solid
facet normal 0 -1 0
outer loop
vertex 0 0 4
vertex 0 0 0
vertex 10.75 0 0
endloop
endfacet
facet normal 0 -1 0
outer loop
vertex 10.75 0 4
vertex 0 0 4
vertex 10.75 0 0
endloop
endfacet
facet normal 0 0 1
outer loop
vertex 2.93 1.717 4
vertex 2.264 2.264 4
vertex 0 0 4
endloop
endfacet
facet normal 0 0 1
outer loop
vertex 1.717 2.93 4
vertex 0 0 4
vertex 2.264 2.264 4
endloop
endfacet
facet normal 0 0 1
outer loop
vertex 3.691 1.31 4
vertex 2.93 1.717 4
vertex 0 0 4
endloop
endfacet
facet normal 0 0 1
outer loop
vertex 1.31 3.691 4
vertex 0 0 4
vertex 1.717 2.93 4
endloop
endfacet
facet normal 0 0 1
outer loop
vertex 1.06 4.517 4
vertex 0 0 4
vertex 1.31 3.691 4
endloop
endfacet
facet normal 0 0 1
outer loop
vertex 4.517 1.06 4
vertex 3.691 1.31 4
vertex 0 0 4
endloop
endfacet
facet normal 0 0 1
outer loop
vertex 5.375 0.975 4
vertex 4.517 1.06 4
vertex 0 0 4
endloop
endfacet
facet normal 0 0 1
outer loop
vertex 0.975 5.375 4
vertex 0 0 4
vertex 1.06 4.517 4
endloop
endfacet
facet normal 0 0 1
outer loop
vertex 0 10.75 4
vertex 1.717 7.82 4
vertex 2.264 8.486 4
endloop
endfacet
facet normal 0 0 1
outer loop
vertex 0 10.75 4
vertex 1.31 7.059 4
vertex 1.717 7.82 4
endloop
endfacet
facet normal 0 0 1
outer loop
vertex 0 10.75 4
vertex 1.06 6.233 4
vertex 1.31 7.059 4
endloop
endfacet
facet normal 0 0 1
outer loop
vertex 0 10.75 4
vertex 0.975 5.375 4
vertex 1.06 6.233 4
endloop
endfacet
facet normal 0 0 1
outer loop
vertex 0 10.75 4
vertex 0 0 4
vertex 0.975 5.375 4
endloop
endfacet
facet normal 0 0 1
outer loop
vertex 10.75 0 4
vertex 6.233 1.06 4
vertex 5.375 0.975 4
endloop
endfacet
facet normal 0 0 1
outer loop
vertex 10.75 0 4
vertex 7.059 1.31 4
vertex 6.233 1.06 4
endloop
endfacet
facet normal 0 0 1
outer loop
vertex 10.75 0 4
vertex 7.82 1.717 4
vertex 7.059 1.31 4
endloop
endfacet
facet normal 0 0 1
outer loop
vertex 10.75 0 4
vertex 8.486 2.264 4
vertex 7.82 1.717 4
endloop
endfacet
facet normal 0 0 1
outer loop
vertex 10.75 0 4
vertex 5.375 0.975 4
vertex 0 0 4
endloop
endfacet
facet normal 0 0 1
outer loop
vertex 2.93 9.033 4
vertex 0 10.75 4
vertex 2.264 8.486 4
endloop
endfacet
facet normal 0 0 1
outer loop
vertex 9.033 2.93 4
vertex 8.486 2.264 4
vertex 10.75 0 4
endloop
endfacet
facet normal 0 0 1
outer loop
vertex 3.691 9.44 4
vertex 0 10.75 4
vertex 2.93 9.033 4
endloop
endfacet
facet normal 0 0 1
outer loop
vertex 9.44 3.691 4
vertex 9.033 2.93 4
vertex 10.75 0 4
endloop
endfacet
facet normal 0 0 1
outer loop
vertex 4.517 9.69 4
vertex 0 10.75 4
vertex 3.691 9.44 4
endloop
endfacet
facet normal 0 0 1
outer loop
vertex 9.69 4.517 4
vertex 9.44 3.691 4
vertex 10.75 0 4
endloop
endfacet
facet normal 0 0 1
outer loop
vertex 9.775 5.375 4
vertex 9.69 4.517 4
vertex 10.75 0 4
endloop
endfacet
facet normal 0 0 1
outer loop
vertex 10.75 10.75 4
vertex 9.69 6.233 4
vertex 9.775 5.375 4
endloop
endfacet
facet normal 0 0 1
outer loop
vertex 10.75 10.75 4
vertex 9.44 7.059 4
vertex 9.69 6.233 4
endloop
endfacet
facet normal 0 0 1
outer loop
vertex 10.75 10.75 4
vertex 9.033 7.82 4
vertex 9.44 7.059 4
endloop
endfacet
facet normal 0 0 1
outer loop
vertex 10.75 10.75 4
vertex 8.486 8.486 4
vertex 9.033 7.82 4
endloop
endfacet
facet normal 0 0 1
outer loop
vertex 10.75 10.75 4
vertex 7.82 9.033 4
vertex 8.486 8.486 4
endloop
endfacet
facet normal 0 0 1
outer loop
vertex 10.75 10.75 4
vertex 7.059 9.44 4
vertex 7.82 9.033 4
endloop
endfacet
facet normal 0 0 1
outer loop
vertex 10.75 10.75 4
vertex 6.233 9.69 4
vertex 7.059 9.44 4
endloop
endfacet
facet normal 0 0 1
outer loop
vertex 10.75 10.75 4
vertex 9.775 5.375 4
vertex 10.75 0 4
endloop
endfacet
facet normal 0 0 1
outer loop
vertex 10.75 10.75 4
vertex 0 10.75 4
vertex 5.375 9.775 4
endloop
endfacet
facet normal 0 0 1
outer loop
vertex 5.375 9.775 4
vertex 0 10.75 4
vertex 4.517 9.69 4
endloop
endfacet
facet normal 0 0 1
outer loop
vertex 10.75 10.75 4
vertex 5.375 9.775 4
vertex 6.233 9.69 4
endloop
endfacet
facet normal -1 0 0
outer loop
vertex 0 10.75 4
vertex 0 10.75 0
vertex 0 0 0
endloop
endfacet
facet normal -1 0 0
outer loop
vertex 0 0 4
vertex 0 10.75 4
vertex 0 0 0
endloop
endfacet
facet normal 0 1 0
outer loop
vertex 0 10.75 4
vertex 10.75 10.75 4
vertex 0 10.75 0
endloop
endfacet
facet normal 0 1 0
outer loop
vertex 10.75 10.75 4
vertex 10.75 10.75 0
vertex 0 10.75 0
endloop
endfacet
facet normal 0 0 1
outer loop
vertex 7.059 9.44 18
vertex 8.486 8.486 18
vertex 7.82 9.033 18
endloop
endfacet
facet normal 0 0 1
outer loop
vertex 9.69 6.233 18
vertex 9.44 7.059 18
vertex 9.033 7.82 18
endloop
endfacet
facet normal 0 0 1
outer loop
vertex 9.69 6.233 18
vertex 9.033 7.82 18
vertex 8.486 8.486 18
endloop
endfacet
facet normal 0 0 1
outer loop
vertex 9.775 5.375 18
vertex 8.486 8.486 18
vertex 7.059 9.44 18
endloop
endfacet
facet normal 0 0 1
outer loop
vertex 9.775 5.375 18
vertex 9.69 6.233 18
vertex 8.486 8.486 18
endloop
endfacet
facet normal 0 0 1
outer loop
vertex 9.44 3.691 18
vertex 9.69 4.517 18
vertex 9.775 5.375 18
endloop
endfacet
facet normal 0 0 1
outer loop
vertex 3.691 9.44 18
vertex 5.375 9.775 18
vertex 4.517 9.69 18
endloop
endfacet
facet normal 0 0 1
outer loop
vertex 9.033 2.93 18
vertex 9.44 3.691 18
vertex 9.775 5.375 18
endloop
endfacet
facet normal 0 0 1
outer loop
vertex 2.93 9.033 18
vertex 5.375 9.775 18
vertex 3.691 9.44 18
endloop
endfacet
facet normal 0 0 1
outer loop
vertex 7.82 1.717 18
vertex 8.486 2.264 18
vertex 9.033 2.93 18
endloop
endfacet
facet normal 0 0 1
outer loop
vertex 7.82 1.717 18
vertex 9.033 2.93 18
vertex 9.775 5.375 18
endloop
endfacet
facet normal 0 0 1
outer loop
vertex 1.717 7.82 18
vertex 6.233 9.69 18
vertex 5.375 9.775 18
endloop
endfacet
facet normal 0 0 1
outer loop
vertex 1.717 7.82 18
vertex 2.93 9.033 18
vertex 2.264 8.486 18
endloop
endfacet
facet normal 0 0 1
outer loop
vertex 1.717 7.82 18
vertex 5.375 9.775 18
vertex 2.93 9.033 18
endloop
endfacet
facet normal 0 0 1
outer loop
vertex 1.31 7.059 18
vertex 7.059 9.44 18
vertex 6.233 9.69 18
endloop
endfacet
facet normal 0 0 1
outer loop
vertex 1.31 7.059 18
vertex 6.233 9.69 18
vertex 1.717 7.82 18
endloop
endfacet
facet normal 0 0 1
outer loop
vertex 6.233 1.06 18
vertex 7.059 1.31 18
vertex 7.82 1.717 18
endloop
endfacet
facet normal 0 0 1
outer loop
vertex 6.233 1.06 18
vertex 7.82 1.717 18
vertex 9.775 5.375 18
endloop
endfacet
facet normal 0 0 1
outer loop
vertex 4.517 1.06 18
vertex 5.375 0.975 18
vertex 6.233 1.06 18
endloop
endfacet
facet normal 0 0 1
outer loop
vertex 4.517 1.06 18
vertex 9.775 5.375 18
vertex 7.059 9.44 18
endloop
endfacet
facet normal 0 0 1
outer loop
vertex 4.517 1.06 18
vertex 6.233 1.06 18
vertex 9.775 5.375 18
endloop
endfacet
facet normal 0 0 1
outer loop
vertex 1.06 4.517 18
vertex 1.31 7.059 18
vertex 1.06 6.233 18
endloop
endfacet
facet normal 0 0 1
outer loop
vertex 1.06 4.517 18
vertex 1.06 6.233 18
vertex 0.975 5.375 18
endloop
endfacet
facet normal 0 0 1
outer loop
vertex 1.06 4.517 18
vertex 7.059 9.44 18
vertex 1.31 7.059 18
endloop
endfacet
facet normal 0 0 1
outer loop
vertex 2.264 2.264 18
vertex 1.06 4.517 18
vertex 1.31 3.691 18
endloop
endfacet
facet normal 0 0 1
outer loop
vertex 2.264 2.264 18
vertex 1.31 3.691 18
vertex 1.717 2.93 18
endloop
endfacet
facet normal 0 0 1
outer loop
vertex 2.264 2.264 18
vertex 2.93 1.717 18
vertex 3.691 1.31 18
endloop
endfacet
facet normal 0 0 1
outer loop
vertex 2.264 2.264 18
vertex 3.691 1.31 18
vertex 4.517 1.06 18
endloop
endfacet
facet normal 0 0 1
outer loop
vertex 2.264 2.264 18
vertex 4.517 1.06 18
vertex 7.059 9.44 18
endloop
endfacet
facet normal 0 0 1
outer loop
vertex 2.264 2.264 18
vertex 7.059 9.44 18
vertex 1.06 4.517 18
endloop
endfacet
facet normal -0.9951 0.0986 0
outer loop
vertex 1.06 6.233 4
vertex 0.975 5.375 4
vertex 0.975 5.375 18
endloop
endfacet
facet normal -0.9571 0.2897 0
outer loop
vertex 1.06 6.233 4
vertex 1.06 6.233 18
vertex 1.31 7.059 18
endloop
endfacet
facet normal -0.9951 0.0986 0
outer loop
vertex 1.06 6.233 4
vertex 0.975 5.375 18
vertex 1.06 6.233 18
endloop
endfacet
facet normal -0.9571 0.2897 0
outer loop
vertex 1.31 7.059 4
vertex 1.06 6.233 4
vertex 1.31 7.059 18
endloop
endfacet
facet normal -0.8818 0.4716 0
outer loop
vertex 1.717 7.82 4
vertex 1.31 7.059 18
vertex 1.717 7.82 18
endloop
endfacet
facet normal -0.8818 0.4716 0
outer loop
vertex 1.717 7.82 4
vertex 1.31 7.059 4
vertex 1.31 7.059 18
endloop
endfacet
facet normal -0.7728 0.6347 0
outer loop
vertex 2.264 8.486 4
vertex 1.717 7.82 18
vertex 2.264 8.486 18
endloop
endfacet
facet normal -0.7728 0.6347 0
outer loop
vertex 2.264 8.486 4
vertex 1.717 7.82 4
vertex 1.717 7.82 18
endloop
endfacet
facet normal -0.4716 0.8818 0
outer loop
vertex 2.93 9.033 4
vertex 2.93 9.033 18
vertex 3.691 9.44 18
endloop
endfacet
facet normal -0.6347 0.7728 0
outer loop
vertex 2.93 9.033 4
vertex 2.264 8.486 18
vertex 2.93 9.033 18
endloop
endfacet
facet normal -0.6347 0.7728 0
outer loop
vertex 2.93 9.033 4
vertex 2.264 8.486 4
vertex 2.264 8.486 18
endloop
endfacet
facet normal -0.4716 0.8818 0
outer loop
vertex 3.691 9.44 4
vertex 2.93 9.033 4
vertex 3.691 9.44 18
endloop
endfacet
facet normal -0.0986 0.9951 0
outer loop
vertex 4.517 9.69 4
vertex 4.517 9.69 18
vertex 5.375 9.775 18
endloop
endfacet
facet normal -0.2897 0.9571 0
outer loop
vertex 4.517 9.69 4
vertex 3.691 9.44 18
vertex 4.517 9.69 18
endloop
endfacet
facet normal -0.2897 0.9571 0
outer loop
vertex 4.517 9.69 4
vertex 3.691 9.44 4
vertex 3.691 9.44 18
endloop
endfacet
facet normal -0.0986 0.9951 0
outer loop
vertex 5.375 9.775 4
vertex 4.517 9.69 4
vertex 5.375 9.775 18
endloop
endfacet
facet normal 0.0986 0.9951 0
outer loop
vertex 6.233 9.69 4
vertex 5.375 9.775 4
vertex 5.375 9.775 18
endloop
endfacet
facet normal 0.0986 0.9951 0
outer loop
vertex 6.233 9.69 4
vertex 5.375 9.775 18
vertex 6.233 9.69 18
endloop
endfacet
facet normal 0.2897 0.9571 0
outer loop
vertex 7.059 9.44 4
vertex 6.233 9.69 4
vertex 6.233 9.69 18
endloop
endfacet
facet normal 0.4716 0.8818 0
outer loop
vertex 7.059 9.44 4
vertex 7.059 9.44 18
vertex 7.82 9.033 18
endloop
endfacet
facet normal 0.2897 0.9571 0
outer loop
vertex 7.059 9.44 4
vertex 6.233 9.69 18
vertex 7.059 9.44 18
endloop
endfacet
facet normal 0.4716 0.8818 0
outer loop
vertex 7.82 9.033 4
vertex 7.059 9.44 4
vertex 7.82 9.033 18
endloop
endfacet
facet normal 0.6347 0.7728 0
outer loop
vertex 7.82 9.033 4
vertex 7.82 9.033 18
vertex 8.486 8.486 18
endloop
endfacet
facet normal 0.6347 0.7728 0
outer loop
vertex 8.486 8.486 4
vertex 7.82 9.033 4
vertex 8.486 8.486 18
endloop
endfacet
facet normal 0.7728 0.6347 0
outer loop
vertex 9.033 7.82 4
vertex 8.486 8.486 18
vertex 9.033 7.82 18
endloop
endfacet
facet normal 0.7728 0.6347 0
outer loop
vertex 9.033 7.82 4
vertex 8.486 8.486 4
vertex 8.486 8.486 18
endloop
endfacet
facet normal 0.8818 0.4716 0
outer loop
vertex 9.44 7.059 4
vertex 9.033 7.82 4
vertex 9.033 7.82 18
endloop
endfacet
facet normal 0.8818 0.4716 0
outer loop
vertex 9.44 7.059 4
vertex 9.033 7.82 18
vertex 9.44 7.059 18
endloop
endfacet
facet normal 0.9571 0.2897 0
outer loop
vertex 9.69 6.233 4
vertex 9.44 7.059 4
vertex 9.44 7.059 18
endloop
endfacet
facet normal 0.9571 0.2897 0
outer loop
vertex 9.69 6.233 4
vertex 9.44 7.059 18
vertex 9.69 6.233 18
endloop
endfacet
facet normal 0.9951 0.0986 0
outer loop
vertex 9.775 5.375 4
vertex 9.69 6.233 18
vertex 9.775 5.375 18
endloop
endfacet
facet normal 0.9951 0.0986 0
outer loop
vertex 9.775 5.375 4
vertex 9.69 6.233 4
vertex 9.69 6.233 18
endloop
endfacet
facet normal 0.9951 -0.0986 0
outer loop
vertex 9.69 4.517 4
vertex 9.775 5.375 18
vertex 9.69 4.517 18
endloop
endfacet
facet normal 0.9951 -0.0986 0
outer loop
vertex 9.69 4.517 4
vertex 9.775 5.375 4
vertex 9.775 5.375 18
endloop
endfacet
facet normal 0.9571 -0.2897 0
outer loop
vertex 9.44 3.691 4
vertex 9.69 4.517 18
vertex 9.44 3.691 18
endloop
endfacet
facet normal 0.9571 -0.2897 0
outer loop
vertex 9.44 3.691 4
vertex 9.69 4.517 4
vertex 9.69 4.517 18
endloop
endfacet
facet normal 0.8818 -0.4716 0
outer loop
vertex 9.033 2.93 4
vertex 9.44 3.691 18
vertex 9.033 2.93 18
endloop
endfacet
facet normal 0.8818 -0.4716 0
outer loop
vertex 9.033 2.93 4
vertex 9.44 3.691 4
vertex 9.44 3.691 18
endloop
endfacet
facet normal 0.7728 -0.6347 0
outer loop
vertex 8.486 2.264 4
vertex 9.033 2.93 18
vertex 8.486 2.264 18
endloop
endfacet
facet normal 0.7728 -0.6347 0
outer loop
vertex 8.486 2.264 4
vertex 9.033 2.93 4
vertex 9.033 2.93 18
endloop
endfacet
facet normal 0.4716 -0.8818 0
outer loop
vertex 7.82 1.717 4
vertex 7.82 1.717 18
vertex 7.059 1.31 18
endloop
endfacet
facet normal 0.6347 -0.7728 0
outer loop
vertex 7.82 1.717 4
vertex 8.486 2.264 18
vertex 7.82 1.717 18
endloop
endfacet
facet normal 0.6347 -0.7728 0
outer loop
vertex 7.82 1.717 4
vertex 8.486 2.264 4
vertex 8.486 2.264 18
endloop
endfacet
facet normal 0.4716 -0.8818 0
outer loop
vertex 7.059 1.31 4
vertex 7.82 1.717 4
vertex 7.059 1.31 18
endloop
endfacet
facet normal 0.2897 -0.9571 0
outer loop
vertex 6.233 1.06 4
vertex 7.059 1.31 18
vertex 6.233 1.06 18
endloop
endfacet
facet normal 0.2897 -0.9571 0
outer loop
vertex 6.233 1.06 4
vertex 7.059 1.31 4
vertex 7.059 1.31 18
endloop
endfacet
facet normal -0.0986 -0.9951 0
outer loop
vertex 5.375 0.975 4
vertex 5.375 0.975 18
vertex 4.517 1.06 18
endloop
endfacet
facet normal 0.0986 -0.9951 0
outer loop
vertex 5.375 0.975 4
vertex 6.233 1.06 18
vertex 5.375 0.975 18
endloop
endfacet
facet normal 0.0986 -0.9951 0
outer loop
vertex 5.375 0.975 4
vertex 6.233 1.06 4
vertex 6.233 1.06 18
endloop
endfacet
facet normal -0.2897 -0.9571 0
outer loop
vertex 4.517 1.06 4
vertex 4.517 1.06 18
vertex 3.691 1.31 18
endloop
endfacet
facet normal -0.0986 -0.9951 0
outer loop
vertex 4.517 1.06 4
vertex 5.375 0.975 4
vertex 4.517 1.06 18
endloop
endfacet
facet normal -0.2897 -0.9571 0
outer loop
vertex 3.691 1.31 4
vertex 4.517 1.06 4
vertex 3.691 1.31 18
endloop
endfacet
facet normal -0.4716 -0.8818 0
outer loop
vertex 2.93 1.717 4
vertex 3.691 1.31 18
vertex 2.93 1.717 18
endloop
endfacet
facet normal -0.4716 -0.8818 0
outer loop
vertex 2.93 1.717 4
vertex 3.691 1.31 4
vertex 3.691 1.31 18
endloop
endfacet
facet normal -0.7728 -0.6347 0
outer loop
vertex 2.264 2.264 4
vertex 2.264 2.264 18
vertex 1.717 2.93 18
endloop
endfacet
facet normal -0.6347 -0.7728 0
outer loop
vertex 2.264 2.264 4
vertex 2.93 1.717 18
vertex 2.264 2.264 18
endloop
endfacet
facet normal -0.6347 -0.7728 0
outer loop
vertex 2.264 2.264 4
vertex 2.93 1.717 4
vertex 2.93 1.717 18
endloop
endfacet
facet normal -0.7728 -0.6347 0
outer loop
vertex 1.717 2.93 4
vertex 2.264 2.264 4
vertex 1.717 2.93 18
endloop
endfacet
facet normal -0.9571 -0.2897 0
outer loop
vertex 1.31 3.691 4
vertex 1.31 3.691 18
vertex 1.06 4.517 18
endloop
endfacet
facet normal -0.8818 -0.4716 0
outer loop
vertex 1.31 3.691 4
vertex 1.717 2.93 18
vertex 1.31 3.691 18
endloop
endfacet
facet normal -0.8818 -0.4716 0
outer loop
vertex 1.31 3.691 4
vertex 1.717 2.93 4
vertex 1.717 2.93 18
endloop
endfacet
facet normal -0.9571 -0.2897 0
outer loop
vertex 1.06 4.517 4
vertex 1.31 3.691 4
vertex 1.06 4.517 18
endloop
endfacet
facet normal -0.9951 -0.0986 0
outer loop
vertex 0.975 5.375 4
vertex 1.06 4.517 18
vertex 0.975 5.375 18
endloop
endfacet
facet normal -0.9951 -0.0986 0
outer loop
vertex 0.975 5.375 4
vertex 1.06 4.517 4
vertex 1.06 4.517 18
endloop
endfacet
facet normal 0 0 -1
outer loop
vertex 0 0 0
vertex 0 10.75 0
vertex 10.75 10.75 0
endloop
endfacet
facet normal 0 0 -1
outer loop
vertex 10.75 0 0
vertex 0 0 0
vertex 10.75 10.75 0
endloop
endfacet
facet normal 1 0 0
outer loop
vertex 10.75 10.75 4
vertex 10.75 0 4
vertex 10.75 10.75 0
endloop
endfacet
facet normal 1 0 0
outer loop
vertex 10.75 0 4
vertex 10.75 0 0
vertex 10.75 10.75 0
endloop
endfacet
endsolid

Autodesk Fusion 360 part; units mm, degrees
sketch "Sketch1" plane through (0, 0, 0) normal (0, 0, 1) x (1, 0, 0)
  line L0 (0, 0) -> (10.75, 0)
  line L1 (10.75, 0) -> (10.75, 10.75)
  line L2 (10.75, 10.75) -> (0, 10.75)
  line L3 (0, 10.75) -> (0, 0)
  dimension "d1" = 10.75
  dimension "d2" = 10.75
extrude "Extrude1" add sketch "Sketch1" along normal blind 4
sketch "Sketch2" plane through (0, 0, 4) normal (0, 0, 1) x (-1, 0, 0)
  line L0 (0, -10.75) -> (0, 0)
  line L1 (0, 0) -> (-10.75, 0)
  line L2 (-10.75, 0) -> (-10.75, -10.75)
  line L3 (-10.75, -10.75) -> (0, -10.75)
  circle A0 centre (-5.375, -5.375) radius 4.4
  dimension "d5" = 8.8
extrude "Extrude2" add sketch "Sketch2" along normal blind 14 contours A0
